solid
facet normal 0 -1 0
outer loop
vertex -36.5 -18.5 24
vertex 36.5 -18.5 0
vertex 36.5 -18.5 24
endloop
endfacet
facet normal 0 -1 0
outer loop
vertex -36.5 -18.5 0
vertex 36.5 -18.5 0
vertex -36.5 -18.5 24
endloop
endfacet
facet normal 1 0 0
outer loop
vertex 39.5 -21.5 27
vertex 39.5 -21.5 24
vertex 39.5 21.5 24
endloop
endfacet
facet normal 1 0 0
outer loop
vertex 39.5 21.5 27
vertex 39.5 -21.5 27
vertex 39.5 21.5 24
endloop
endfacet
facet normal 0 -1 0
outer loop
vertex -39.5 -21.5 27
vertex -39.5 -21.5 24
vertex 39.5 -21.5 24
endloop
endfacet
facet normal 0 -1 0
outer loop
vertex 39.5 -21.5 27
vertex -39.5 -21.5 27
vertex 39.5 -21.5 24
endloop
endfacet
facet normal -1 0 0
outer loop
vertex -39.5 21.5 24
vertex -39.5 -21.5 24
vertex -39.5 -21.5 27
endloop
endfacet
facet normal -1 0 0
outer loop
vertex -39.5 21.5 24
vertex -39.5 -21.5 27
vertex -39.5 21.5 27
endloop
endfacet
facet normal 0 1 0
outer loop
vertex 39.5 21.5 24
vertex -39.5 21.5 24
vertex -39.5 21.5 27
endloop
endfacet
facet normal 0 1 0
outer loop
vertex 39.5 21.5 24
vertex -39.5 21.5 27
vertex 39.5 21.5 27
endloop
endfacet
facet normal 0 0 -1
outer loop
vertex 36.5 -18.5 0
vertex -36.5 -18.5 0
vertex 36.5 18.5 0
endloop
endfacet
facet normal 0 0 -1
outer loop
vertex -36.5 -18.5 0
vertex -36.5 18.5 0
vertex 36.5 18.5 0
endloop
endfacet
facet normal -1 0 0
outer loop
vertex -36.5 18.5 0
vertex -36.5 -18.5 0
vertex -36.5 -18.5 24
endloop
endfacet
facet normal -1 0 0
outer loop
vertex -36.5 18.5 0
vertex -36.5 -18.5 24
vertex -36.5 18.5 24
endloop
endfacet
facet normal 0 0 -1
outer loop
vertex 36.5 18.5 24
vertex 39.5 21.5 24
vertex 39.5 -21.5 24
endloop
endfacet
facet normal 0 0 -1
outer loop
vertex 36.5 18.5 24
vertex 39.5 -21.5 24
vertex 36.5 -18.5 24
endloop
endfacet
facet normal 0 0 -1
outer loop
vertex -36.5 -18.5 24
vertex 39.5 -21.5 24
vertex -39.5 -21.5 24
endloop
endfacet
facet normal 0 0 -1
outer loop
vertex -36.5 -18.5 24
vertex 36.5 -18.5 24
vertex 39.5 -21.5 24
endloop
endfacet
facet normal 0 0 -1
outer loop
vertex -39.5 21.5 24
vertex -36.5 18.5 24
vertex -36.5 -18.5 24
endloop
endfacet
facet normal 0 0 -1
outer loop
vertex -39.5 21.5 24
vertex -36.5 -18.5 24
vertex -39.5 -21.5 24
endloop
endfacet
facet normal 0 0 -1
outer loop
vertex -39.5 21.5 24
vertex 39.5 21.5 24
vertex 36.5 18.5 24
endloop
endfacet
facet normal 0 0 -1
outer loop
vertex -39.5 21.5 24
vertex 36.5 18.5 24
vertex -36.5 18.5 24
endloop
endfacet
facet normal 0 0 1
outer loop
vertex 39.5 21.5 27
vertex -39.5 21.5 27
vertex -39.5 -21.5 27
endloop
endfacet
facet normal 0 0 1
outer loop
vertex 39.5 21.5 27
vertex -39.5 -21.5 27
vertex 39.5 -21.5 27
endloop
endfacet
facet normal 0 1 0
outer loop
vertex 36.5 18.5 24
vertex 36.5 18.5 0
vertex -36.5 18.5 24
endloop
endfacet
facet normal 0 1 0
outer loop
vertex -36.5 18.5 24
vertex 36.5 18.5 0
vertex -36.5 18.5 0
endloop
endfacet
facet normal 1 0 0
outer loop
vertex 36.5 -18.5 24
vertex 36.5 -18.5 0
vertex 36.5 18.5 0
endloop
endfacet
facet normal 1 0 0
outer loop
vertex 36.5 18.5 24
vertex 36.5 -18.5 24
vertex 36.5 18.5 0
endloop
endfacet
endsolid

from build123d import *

# Parameters (mm, degrees)
SKIZZE1_W                       = 79
SKIZZE1_H                       = 43
AUFSATZ_LINEAR_AUSTRAGEN1_DEPTH = 27
SKIZZE2_W                       = 79
SKIZZE2_H                       = 43
SKIZZE2_W_2                     = 73
SKIZZE2_H_2                     = 37
SCHNITT_LINEAR_AUSTRAGEN1_DEPTH = 24


with BuildPart() as part:
    # Skizze1 → Aufsatz-Linear austragen1 (new body)
    with BuildSketch(Plane.XY):
        Rectangle(SKIZZE1_W, SKIZZE1_H)
    extrude(amount=AUFSATZ_LINEAR_AUSTRAGEN1_DEPTH)

    # Skizze2 → Schnitt-Linear austragen1 (cut)
    with BuildSketch(Plane(origin=(0, 0, 0), x_dir=(-1, 0, 0), z_dir=(0, 0, -1))):
        Rectangle(SKIZZE2_W, SKIZZE2_H)
        Rectangle(SKIZZE2_W_2, SKIZZE2_H_2, mode=Mode.SUBTRACT)
    extrude(amount=-SCHNITT_LINEAR_AUSTRAGEN1_DEPTH, mode=Mode.SUBTRACT)


solid = part.part
